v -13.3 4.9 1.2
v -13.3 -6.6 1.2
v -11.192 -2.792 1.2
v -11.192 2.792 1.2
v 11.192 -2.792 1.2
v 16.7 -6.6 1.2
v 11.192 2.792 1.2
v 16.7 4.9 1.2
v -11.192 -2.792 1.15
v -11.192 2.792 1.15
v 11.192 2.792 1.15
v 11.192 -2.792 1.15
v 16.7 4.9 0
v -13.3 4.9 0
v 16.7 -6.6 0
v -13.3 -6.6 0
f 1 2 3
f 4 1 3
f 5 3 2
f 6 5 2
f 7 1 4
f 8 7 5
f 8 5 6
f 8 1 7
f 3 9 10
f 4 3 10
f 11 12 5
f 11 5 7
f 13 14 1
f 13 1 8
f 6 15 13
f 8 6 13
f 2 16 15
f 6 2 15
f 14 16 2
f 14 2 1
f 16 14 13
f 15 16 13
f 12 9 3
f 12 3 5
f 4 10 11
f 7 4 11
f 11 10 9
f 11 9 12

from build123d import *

# Parameters (mm, degrees)
SKETCH_1_W      = 30
SKETCH_1_H      = 11.5
SKETCH_1_W_2    = 22.384
SKETCH_1_H_2    = 5.584
EXTRUDE_2_DEPTH = 1.2
SKETCH_1_6_W    = 22.384
SKETCH_1_6_H    = 5.584
EXTRUDE_4_DEPTH = 1.15


with BuildPart() as part:
    # 草图1 → 凸台-拉伸2 (new body)
    with BuildSketch(Plane.XY):
        with Locations((1.7, -0.85)):
            Rectangle(SKETCH_1_W, SKETCH_1_H)
        Rectangle(SKETCH_1_W_2, SKETCH_1_H_2, mode=Mode.SUBTRACT)
    extrude(amount=EXTRUDE_2_DEPTH)

    # 草图1<6> → 凸台-拉伸4 (add)
    with BuildSketch(Plane.XY):
        Rectangle(SKETCH_1_6_W, SKETCH_1_6_H)
    extrude(amount=EXTRUDE_4_DEPTH)


solid = part.part
